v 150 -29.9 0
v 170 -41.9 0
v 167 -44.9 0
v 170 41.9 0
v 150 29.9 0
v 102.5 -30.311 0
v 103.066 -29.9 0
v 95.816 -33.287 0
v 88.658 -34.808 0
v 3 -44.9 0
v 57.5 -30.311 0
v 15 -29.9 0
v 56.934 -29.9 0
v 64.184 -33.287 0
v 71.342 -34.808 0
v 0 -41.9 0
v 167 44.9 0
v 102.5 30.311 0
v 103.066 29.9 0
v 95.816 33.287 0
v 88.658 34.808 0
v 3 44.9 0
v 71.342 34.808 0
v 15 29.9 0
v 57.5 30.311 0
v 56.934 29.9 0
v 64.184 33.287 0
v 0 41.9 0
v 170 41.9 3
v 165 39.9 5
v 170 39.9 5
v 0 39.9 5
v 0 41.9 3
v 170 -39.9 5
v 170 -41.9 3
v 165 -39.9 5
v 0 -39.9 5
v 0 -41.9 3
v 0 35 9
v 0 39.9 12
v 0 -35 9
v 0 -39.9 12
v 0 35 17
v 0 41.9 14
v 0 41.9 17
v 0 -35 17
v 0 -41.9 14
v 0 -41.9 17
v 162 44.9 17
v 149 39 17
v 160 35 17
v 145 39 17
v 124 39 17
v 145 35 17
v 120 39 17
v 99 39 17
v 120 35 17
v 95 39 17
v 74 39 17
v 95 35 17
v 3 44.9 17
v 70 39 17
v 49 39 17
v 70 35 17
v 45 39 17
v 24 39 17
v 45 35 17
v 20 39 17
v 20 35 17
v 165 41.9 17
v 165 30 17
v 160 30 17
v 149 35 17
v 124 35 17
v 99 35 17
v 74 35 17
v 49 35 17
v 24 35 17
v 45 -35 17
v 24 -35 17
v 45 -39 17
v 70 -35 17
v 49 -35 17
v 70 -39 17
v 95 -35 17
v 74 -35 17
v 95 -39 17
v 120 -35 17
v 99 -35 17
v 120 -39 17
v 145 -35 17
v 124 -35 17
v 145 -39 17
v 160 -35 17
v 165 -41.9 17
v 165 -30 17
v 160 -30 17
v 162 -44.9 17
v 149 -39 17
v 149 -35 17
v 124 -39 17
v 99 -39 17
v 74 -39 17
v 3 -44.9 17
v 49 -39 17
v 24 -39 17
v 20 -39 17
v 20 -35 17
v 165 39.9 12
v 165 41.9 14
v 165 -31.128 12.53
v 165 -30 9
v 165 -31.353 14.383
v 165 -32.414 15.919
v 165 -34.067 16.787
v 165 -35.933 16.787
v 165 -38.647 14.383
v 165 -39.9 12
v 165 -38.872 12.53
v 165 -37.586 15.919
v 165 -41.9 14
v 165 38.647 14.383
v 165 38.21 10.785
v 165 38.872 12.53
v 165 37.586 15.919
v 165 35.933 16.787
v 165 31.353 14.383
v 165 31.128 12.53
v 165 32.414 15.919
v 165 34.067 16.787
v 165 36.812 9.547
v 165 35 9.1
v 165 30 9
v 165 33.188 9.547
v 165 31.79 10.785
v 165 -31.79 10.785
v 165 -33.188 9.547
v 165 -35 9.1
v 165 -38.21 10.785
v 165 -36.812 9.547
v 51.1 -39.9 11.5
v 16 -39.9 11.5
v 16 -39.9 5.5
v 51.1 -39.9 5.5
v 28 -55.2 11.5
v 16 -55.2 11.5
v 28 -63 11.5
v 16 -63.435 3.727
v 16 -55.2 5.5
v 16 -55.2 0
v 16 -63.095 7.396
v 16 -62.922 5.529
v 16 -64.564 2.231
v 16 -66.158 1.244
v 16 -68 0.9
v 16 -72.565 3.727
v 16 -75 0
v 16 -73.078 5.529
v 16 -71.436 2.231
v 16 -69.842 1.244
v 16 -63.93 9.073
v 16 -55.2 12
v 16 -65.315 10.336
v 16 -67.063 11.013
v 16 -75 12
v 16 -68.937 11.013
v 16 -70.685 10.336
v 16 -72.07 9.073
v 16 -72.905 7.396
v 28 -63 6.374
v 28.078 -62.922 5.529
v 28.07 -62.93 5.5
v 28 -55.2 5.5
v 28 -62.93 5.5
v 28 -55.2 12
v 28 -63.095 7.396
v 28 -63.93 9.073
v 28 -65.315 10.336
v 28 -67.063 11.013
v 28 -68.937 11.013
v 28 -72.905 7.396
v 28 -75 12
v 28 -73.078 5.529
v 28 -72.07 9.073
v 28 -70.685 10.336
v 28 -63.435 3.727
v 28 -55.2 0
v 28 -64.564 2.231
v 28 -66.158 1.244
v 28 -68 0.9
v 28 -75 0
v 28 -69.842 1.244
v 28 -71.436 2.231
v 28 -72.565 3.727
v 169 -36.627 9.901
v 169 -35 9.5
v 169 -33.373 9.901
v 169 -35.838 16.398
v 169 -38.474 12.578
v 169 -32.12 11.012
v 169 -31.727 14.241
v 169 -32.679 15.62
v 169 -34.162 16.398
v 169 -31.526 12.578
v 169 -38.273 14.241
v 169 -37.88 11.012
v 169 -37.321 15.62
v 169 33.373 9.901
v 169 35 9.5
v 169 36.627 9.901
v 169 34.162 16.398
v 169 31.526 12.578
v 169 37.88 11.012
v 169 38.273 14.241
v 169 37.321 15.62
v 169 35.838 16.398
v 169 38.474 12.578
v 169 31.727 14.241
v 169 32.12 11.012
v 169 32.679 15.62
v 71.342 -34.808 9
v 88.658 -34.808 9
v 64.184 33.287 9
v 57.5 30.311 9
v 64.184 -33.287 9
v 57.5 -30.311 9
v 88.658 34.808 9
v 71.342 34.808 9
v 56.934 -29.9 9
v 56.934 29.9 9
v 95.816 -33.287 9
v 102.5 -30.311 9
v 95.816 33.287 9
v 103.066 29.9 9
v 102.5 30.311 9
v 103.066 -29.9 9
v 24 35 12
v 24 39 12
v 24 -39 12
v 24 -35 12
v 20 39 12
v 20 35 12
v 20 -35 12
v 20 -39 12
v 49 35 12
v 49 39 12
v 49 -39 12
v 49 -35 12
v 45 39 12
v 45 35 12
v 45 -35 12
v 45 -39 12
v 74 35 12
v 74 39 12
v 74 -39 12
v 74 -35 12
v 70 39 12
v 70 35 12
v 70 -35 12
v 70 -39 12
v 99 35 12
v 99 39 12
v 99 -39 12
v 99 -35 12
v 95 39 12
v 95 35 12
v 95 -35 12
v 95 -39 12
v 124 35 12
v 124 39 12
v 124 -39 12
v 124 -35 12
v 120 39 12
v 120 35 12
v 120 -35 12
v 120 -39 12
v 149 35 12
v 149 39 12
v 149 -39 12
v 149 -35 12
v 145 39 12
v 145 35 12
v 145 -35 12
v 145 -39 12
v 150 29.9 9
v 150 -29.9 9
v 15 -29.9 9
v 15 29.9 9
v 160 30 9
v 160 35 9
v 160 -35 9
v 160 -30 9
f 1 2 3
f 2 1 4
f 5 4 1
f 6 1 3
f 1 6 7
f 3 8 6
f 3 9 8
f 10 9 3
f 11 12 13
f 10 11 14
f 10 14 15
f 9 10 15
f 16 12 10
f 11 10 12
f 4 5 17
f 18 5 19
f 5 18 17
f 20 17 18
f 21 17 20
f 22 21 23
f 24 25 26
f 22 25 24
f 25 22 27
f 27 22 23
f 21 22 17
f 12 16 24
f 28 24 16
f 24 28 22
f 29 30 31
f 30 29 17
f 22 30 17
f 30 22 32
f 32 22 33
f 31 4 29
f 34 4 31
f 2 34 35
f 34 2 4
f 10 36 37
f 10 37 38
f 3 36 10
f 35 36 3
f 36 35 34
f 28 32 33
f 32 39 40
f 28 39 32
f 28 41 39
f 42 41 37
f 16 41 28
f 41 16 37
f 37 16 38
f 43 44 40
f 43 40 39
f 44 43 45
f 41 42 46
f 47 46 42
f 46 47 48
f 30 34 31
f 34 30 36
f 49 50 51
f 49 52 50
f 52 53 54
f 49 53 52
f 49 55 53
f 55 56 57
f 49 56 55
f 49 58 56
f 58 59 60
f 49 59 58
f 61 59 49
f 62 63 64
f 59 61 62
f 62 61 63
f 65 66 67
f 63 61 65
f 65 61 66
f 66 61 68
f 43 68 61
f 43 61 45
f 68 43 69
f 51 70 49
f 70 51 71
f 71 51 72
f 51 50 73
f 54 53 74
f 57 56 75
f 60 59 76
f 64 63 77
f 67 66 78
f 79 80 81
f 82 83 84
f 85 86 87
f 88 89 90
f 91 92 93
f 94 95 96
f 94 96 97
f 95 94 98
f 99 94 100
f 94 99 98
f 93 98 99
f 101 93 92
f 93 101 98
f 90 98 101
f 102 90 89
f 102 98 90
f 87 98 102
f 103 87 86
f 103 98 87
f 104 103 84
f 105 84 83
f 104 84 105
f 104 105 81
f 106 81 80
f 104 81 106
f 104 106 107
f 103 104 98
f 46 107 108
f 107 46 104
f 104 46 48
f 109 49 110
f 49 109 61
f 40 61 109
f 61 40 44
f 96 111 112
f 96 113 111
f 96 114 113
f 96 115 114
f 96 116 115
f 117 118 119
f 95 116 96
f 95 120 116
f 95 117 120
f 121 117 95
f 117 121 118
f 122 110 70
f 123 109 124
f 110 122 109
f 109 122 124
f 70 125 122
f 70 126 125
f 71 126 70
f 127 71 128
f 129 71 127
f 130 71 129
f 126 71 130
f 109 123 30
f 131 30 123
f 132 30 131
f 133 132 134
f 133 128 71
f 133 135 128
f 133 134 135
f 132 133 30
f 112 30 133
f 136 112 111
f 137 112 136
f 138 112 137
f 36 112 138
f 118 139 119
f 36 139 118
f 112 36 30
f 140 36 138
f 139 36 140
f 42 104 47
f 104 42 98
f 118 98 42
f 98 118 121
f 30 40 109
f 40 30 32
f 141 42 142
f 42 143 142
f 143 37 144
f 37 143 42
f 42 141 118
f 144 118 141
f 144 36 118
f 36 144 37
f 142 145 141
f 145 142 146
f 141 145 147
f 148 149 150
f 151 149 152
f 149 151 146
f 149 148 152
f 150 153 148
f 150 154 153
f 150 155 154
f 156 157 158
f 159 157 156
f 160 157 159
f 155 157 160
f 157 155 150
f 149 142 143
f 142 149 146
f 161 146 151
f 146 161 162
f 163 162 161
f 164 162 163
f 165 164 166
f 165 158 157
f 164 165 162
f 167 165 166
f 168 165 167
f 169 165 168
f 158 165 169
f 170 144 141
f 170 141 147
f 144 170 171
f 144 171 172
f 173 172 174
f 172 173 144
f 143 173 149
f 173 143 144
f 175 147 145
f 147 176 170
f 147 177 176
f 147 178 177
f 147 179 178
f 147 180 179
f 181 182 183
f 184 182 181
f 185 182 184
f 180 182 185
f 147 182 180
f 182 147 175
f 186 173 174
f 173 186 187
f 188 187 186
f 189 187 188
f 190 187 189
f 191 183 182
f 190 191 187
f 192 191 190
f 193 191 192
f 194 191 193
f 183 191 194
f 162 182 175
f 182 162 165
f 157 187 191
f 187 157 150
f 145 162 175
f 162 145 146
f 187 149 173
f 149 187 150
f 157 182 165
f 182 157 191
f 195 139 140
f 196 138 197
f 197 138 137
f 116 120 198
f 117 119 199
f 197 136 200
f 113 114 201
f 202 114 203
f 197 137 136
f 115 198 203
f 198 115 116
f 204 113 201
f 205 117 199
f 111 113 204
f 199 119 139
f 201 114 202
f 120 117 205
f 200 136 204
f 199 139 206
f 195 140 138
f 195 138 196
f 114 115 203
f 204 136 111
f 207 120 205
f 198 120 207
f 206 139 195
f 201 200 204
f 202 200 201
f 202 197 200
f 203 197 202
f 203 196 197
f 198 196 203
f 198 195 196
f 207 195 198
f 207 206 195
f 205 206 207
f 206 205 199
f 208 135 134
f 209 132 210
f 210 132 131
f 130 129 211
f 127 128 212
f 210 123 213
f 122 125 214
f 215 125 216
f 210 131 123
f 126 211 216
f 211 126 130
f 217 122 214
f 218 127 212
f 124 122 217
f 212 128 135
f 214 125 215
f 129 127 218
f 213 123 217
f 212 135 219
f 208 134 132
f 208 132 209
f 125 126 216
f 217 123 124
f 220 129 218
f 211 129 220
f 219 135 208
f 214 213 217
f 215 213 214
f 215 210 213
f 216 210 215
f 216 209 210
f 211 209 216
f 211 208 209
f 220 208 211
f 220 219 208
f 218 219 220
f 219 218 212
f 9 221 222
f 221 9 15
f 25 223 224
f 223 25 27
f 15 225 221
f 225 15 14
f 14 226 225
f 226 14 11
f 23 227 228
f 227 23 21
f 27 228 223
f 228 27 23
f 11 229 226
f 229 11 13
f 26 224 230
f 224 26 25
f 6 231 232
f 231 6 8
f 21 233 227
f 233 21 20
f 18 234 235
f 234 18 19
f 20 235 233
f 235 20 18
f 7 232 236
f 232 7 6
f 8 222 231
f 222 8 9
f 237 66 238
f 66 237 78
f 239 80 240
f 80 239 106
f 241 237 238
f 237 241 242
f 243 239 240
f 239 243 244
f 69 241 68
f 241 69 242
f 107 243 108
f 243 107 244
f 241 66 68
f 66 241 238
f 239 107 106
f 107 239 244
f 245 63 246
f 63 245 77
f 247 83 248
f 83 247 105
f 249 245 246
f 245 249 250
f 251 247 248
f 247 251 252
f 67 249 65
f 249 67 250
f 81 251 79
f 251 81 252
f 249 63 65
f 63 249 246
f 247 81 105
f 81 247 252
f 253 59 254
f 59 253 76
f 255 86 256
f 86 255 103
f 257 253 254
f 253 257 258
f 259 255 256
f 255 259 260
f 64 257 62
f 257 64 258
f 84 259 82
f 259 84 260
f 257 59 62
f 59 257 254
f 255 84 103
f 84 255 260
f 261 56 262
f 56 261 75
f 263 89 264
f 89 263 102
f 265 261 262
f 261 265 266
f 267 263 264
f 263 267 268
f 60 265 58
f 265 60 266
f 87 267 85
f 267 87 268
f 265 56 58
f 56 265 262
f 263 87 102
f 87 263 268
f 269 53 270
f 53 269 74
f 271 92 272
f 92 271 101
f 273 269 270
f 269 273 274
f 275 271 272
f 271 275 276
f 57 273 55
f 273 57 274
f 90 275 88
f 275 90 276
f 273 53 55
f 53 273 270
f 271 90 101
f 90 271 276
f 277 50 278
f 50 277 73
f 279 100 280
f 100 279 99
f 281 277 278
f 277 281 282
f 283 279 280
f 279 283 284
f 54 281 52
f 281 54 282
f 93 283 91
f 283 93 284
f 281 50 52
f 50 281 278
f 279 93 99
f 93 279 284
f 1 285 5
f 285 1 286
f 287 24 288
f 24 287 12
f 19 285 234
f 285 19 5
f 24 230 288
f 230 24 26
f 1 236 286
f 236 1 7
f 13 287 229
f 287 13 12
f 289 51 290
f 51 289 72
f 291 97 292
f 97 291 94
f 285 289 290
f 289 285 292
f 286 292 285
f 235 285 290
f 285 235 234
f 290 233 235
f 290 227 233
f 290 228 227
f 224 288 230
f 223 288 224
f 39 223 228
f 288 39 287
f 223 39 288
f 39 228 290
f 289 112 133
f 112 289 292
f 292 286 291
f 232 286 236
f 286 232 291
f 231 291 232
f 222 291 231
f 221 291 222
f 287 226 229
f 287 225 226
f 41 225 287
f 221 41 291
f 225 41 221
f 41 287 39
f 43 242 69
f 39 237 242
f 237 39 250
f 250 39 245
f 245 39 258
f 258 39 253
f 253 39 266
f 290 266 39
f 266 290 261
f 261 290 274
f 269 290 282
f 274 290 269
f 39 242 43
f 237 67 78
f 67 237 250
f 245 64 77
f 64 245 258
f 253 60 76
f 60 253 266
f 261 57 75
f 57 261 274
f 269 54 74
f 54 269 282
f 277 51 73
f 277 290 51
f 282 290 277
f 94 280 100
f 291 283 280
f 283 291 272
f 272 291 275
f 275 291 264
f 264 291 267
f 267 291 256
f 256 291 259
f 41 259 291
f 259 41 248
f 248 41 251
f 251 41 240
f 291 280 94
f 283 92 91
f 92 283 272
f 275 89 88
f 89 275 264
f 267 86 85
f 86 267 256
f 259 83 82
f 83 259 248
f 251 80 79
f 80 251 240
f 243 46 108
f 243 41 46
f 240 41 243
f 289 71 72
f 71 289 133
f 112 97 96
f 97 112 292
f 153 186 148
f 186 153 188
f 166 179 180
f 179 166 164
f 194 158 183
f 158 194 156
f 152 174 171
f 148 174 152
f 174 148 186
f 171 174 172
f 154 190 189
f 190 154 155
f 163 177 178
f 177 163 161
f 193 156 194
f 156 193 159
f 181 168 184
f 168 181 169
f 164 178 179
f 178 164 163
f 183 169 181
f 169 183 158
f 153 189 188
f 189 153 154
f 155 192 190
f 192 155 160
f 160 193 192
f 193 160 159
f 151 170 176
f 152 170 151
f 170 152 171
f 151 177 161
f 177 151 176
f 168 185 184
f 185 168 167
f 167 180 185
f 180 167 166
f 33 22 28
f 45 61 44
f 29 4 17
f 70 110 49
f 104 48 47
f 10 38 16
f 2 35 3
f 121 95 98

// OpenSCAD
// file: config_4x5.scad
/*
This is the base configuration file for the 4x5" format
# we are not using the exact ANSI measures, but slightly rounded measures for slight simplification
*/
vStabilizerTotal_h = 7;

// general tolerance
vTolerance = 0.2;

// sheet film and cassette measurements (roughly based on the ANSI measurements)
vFilmSheet_l = 127;
vFilmSheet_w = 102;
vCassette_l = 160; // A min
vCassette_w = 121; // B max
vCassette_h = 13.2; // C max
vLightTrap_l = 2; // M2
vLightTrap_w = vCassette_w;
vLightTrap_h = 1.5; // M1
vLightTrap_offsetX = 141; // G max
vFilmWindow_l = 121;
vFilmWindow_w = 101;
vFilmWindow_offsetX = 16;
vGroundGlass_offsetZ = 5;

// Graflok
vGraflok_h = 6; // this is not the official measurement, just measured from a camera 

// lens board measures (we are using Wista/Technika-style lensboards)
vLensboard_l = 100;
vLensboard_w = 97;
vLensboard_h = 2;
vLensboard_offsetX = -(vLensboard_l+3)/2; // caution: we have an asymetric offset!
vLensboard_offsetY = -vLensboard_w/2;
vLensboardHole_d = 85;
vLensboardLighttrap_d = 89;
vLensboardLighttrap_h = 1+vTolerance;

// bellows frame measures - the bellows frame design is derived from standardcameras.com
// back frame
vBellowsBackInner_l = 144; //???? check and replace with the measurement from your bellows!
vBellowsBackInner_w = vBellowsBackInner_l;
vBellowsBackOuter_l = vBellowsBackInner_l+1;
vBellowsBackOuter_w = vBellowsBackOuter_l;

vBellowsBackFrameOuter_l = 159;
vBellowsBackFrameOuter_w = vBellowsBackFrameOuter_l;
vBellowsBackFrameOuter_h = 7;
vBellowsBackFrameInner_l = 135;
vBellowsBackFrameInner_w = vBellowsBackFrameInner_l;
vBellowsBackFrameInner_h = 5;

vBellowsBackLightTrapOuter_l = vBellowsBackFrameInner_l+2*2;
vBellowsBackLightTrapOuter_w = vBellowsBackLightTrapOuter_l;
vBellowsBackLightTrap_h = 3;

vBellowsBackFrameScrewHole_d = 2;
vBellowsBackFrameScrewHole_h = 10;
vBellowsBackFrameScrewHole_offsetXY = 70;
vBellowsBackFrameScrewHole_offsetZ = vBellowsBackFrameOuter_h/2;

// front frame
vBellowsFrontInner_l = 94; //???? check and replace with the measurement from your bellows!
vBellowsFrontInner_w = vBellowsFrontInner_l;
vBellowsFrontOuter_l = vBellowsFrontInner_l+1;
vBellowsFrontOuter_w = vBellowsFrontOuter_l;

vBellowsFrontFrameOuter_l = 104;
vBellowsFrontFrameOuter_w = vBellowsFrontFrameOuter_l;
vBellowsFrontFrameOuter_h = 7;
vBellowsFrontFrameInner_l = 82;
vBellowsFrontFrameInner_w = vBellowsFrontFrameInner_l;
vBellowsFrontFrameInner_h = 5;

vBellowsFrontLightTrapOuter_l = vBellowsFrontFrameInner_l+2*2;
vBellowsFrontLightTrapOuter_w = vBellowsFrontLightTrapOuter_l;
vBellowsFrontLightTrap_h = 0;

vBellowsFrontFrameScrewHole_d = 2;
vBellowsFrontFrameScrewHole_h = 10;
vBellowsFrontFrameScrewHole_offsetXY = 40;
vBellowsFrontFrameScrewHole_offsetZ = vBellowsFrontFrameOuter_h/2;

// body dimensions
vWall_strength = 5;
vBodyOuter_l = 185; // make sure this is at least 4*vWall_strength larger than vBellowsBackFrameOuter_l!
vBodyOuter_w = 170; // make sure this is at least 2*vWall_strength larger than vBellowsBackFrameOuter_l!
vBodyOuter_h = 65;
vBodyEdge_r = vWall_strength;

// we will center our model on the Y axis and on the center of the bellows frame
// at least for the 4x5 version, we have to do an asymetric offset of 2.5mm on the X-axis 
vAsymOffsetX = -2.5;  

// back plate
vBackPlateLength = 160; // we will probably use about the same size as the bellows back frame
vBackPlateStrength = vWall_strength;

// hinges for front lid
vHingeInnerDistance = 100;
vHingeBaseWidth = 20;
vHingeHole = 5;

// lid lock measures
vLidLockBase_d = 8;
vLidLockHole_distance = 70;

// rail dimensions
vLowerRail_w = 90;
vUpperRail_w = vLowerRail_w;

// cutout for stop indents
vStopIndent_l = 4;
vStopIndent_h = 5;
vStopIndentDistance = 25; // shorter than 25 is not necessary
vStopIndent_offsetX = 20; // don't go shorter than 20 if you intend to use a 90mm lens!

// for all dovetails we use a base width of 5mm and a base height of 5mm
// we are applying tolerances to the inner AND outer part of a dovetail, in width and height
vDoveTail_w = 5;
vDoveTail_h = 5;
vDoveTail_tolerance = 0.2;

// front standard carrier / slider
// width is depending on vUpperRail_w
vSliderBase_w = vUpperRail_w + (4*vDoveTail_w);
vSliderBase_l = 40; // make sure to have enough space in the body.


// lever plate 
vLeverPlateBase_w = vUpperRail_w - (8*vDoveTail_w);
vLeverPlateBlock_w = 25;
vLeverPlateBlock_l = vSliderBase_l-(2*vDoveTail_w);

vFrontStandard_h = 130;
vFrontStandardSlot_h = vFrontStandard_h - 30;

// lensboard carrier
vFrontPlate_length = vSliderBase_w+6; // vSliderBase_w is a bit too tight for 4x5", so there we will add 5mm, for 5x7 vSliderBase_w is OK to get a squared lensboard carrier
vFrontPlate_width = vSliderBase_w; //vFrontPlate_length;
vFrontPlate_height = 16;
vEdgeCutCylinder = floor(sqrt(2*pow(vFrontPlate_width,2)))-5;

vTiltDovetailBase_d1 = 30;
vTiltDovetailBase_d2 = vTiltDovetailBase_d1+(2*vDoveTail_w);
vTiltDovetailBaseBlock_d = vTiltDovetailBase_d1+(4*vDoveTail_w);

vTiltDovetail_d1 = vTiltDovetailBase_d1-vTolerance;
vTiltDovetail_d2 = vTiltDovetailBase_d2-vTolerance;
vTiltDovetail_h = vDoveTail_w-vTolerance;

vTiltDovetailCutout_d1 = vTiltDovetailBase_d2+vTolerance;
vTiltDovetailCutout_d2 = vTiltDovetailBase_d1+vTolerance;

vAxisHole_d = 10+vTolerance;
vAxisHole_h = vDoveTail_w+vTolerance;

vTiltLockBolt_d = 12;
vTiltLockBolt_h = 14;
vTiltLockBoltHole_d = 8;
vTiltLockBoltHole_h = vTiltLockBolt_h;

vTiltHeight = 50;
vTiltRadius = vFrontPlate_length/2;
vTiltAngleMinus = -7;
vTiltAnglePlus = 7;
vTiltAxis_d = 10-vTolerance;

// focusing rod
vFocusingRod_d = 6;
vFocusingKnob_d = 25;
vFocusingKnob_h = 20;

// stabilizer measures (just the outer measures of our stabilizer block, not the tripod slider)
vStabilizerBase_l = 135;
vStabilizerBase_w = 90;  
vStabilizerBase_h = 7;
vStabilizerDovetailBase_w = 50;
// screw holes for the stabilizer
vLidHoleCount_x = 4;
vLidHoleDist_x = 35;
vLidHoleCount_y = 2;
vLidHoleDist_y = 60;


// screw diameters, length is individually set
vScrew1Hole_d = 3;
vScrew1ThreadHole_d = 2.2;
vScrew2Hole_d = 2;
vScrew2ThreadHole_d = 1.4;


 
// file: modules.scad
/*
This is a collection of the modules which are used heavily within the whole project.
Almost all parts rely on the modules to remain "as is", especially regarding their current orientation.
So please act very carefully here, otherwise you may screw up the complete design!

*/
include <baseconfig.scad>;


// roof module - this is heavily used for dovetail cutouts
// please keep as is
module roof(l, w, h){
    polyhedron(
        points=[
            [0,0,0],
            [l,0,0],
            [l,w,0],
            [0,w,0],
            [0,w/2,h],
            [l,w/2,h]
            ],
        faces=[
            [0,1,2,3],
            [0,4,1],
            [1,4,5,2],
            [2,5,3],
            [3,5,4,0]
            ]
            );
    };

// a wedge module - this is heavily used for cutting edges
// please keep as is    
module wedge(l, w, h) {
    polyhedron(
            points=[
                [0,0,0],
                [l,0,0],
                [l,w,0],
                [0,w,0],
                [0,0,h],
                [l,0,h]
            ],
            faces=[
                [0,3,2,1],
                [0,1,5,4],
                [1,2,5],
                [2,3,4,5],
                [3,0,4]
            ]
    );
   };

// simple tube module.   
module tube(d1, d2, h) {
    difference() {
        cylinder(d=d1, h=h);
        cylinder(d=d2, h=h);
        };
    };

// mainly used for making holes for countersunk screws
// please keep as is    
module countersunk_screw(vScrew_d, vScrew_l){
    union(){
    cylinder(d=vScrew_d, h=vScrew_l);
    cylinder(d1=vScrew_d*2, d2=0, h=vScrew_d);
    };
};

// module for making hexagons, e.g. hex nuts. kw is the key width
// please keep as is
module hex(kw, h) {
	render()
        translate([0, 0, h/2])
            intersection_for(a = [0, 120, 240]) {
                rotate([0, 0, a])
                    cube([kw, 3 * kw, h], true);
                }
}


// Heatset insert
// d: Thread diameter
// od: Outer diameter
// l: Total length
module insert(d, od, l)
{
    echo(Insert = d, od, l);
    difference() {
        cylinder(l, d=od, $fn=15);
        translate([0, 0, -0.5]) cylinder(l+1, d=d, $fn=15);
        };
}

module insert_m2()
{
    color("gold") insert(2, vInsertM2Size_d, vInsertM2Depth_h);
}

module insert_m3()
{
    color("gold") insert(3, vInsertM3Size_d, vInsertM3Depth_h);
}

module insert_m5()
{
    color("gold") insert(5, vInsertM5Size_d, vInsertM5Depth_h);
}

// Countersunk screw, metric, for display
// Example: https://www.aliexpress.com/item/1005007838338973.html
module screw_cs(l, d=3, dk=6, s=2, t=1) {
    // l: total length (including head) in mm
    // d: thread diameter (eg 3 for M3)
    // dk: max head diameter
    // s: hex socket flat-to-flat size
    // t: hex socket depth
    echo(CountersunkScrew = d, l);
    difference() {
        union() {
            cylinder(h=l, r=d/2, $fn=15);
            cylinder(h=(dk-d)/2, r1=dk/2, r2=d/2, $fn=15);
            }
        cylinder(h=t, r=s/2*2/sqrt(3), $fn=6);
    }
}

module screw_m3_cs(l) {
    color("silver") screw_cs(l, d=3, dk=6, s=2, t=1);
}

module screw_m2_cs(l) {
    color("silver") screw_cs(l, d=2, dk=3.8, s=1.5, t=0.75);
}
module screw_m5_cs(l) {
    color("silver") screw_cs(l, d=5, dk=9.5, s=3, t=1.6);
}

// Button head screw, metric, for display
// Example: https://www.aliexpress.com/item/32967225441.html
module screw_bh(l, d=3, k=1.5, dk=5.5, s=2, t=1) {
    // l: shaft length (NOT including head) in mm
    // d: thread diameter (eg 3 for M3)
    // k: head depth
    // dk: head max diameter
    // s: hex socket flat-to-flat size
    // t: hex socket depth
    echo(BallheadScrew = d, l);
    difference() {
        union() {
            translate([0, 0, k]) cylinder(h=l, r=d/2, $fn=15);
            difference() {
                translate([0, 0, k]) intersection() {
                    sphere(d=dk, $fn=15);
                    translate([-dk/2, -dk/2, -dk]) cube(dk);
                }
                translate([-dk/2, -dk/2, -dk]) cube(dk);
            }
        }
        cylinder(h=t, r=s/2*2/sqrt(3), $fn=6);
    }
}

module screw_m2_bh(l) {
    color("silver") screw_bh(l, d=2, dk=3.4, s=1.175, t=0.6);
}

module screw_m3_bh(l) {
    color("silver") screw_bh(l, d=3, dk=5.7, s=2, t=1);
}


module nut_m5() {
    echo(Nut = 5);
    difference() {
        rotate([0, 0, 30]) cylinder(h=3.9, d=8*2/sqrt(3), $fn=6);
        cylinder(h=5, d=5, $fn=15);
        }
    }
    
    
module thumbscrew(bolt_d, bolt_dk, screw_d, screw_h, n_knurls, knurl_d, knurl_f) {
    // bolt_d:  central bolt diameter
    // bolt_dk: bolt head max diameter
    // screw_d: thumbscrew outer diameter
    // screw_h: thumbscrew height
    // n_knurls: number of knurls
    
    min_knurl_offset = screw_d/2 - knurl_d;
    max_knurl_offset = screw_d/2 + knurl_d;
    knurl_offset = min_knurl_offset + knurl_f*(max_knurl_offset - min_knurl_offset);
    
    difference()
    {
        union()
        {
            translate([0, 0, 1]) cylinder(screw_h-2, d=screw_d);
            cylinder(1, d1=screw_d-1, d2=screw_d);
            translate([0, 0, screw_h-1]) cylinder(1, d1=screw_d, d2=screw_d-1);
        }
        cylinder(screw_h, d=bolt_d);
        cylinder(bolt_dk/2, d1=bolt_dk, d2=0);
        for (i = [1:n_knurls])
        {
            rotate([0, 0, i*360/(n_knurls)]) translate([knurl_offset, 0, 0]) cylinder(screw_h, d=knurl_d);
        }
    }
}

module thumbscrew_m5(screw_d, screw_h, n_knurls, knurl_d, knurl_f) {
    thumbscrew(5, 9.5, screw_d, screw_h, n_knurls, knurl_d, knurl_f);
}


module t6_flange_coupler() {
    // T6 flange coupler
    // Example: https://www.aliexpress.com/item/1005008049363389.html
    echo(FlangeCoupler = 6);
    difference() {
        union() {
            translate([0, 0, 2]) cylinder(h=10, d=10);
            cylinder(h=2, d=22);
        }
        cylinder(h=12, d=6);
        translate([0, 15, 7]) rotate([90, 0, 0]) cylinder(h=30, d=3);
        for (i = [0:3]) {
            rotate([0, 0, 45+90*i]) translate([-8, 0, 0]) cylinder(h=2, d=3);
        }
    }
}


module AXK0619_thrust_bearing() {
    echo(ThrustBearing = "AXK0619");
    difference() {
        cylinder(h=4, d=19);
        cylinder(h=4, d=6);
    }
}


module t6_lead_screw(l) {
    echo(LeadScrewT6 = l);
    color("silver") cylinder(h=l, d=6);
}

module t6_lead_screw_nut() {
    echo("LeadScrewT6Nut");
    intersection()
    {
        difference() {
            union() {
                cylinder(h=15, d=12);
                translate([0, 0, 1.5]) cylinder(h=3.5, d=24);
            }
            cylinder(h=15, d=6);
        }  
        translate([-50, -12.5/2, -50]) cube([100, 12.5, 100]);
    }
}

module m5_rod(l) {
    echo(ThreadedRodM5 = l);
    color("silver") cylinder(h=l, d=5);
}


module screw_m3_grub(l) {
    echo(GrubScrew = 3, l);
    cylinder(h=l, d=3, $fn=15);
}
// file: baseconfig.scad
/*
Here we define some variables which are independent from the camera format
*/


// some generic variables

// we are including a format specific configuration sheet - but make sure to include only one!

include <config_4x5.scad>;
// include <config_5x7.scad>;
// include <config_8x10.scad>;

// Arca Swiss tripod plate
// caution: some Arca Swiss compatible tripod heads may have slight variations
// vArca_length = xx; // the length is irrelevant here
vArca_width = 38;
vArca_height = 7;
vArcaBase_cutout = 4;
vArcaBase_height = 1.5;
// main file
// loading the base configuration
include <baseconfig.scad>;

// some modules such as hex, countersunk screws, roof, wedge are available in a module file
use <modules.scad>;
    
// some measures in here are hard wired based on the experience with the first prototype. Normally there is no need to change them (except a measure is hinted with "adapt")

module rails() {

vRailTolerance = vTolerance;
    
vLowerRail_l = vBodyOuter_l-15; // we need 5mm space to move backwards for the lid lock
vLowerRailOuter_w = vLowerRail_w-vRailTolerance;
vLowerRailInner_w = vLowerRail_w-(2*vDoveTail_w)-vRailTolerance;
vLowerRail_h = vDoveTail_h;
vLowerRail_offsetX = 0;
vLowerRail_offsetY = -vLowerRailOuter_w/2;
vLowerRail_offsetZ = 0;

vUpperRail_l = vLowerRail_l-5;
vUpperRailOuter_w = vLowerRailOuter_w;
vUpperRail_h = vLowerRail_h;
vUpperRail_offsetX = 0;
vUpperRail_offsetY = -(vUpperRailOuter_w/2);
vUpperRail_offsetZ = 0;

vMidSection_h = 7; // 7 should fit for 4x5 and 5x7

vUpperBlock_l = vUpperRail_l;
vUpperBlock_w = vLowerRailInner_w;
vUpperBlock_h = vUpperRail_h + vMidSection_h;
vUpperBlock_offsetX = 0;
vUpperBlock_offsetY = -vUpperBlock_w/2;
vUpperBlock_offsetZ = vLowerRail_h;

vMidCutout_l = vUpperRail_l-30;
vMidCutout_w = vLowerRailOuter_w-30;
vMidCutout_h = vLowerRail_h+vUpperBlock_h;
vMidCutout_offsetX = 15;
vMidCutout_offsetY = -vMidCutout_w/2;
vMidCutout_offsetZ = 0;

vUpperCutout_l = vUpperRail_l-5;
vUpperCutout_w = vUpperRailOuter_w-(4*vDoveTail_w)+vRailTolerance;
vUpperCutout_h = vMidSection_h+1;
vUpperCutout_offsetX = 0;
vUpperCutout_offsetY = -vUpperCutout_w/2;
vUpperCutout_offsetZ = vMidCutout_h-vUpperCutout_h;

vFrontCutout_l = vUpperRail_l;
vFrontCutout_w = vUpperCutout_w-10;
vFrontCutout_h = vUpperCutout_h;
vFrontCutout_offsetX = 0;
vFrontCutout_offsetY = -vFrontCutout_w/2;
vFrontCutout_offsetZ = vUpperCutout_offsetZ;

vLensCutout_d = vUpperCutout_w; 
vLensCutout_h = vLowerRail_h+vUpperBlock_h;
vLensCutout_offsetX = (vLowerRail_l/2)-10; 
vLensCutout_offsetY = 0;
vLensCutout_offsetZ = 0;

// cutout for stop indents
vStopIndent_w = vUpperCutout_w + (2*vStopIndent_l);
vStopIndentCount = floor(vUpperRail_l/vStopIndentDistance);
vStopIndent_offsetY = -vStopIndent_w/2;
vStopIndent_offsetZ = vLowerRail_h+vMidSection_h+vUpperRail_h-vStopIndent_h;

vFocusingLever_w = (vBodyOuter_w/2)-10;
vFocusingLever_l = vFocusingLever_w;
vFocusingLever_h = vMidSection_h-1;
vFocusingLever_offsetX = 16; // manually set, probably no need to change things here
vFocusingLever_offsetY = 0;
vFocusingLever_offsetZ = vLowerRail_h + vFocusingLever_h + 0.5;

vFocusingThreadBlock_l = 12; // as long as we keep T5 or T6 rods, there's no need to change things here
vFocusingThreadBlock_w = 20-vTolerance;
vFocusingThreadBlock_h = 12;
vFocusingThreadBlock_offsetX = vFocusingLever_offsetX;
vFocusingThreadBlock_offsetY = -vFocusingLever_w;
vFocusingThreadBlock_offsetZ = 0;

vFocusingThreadHole_d = 10+vTolerance; // T6 = 10, T5 = 8
vFocusingThreadHole_h = vFocusingLever_l;
vFocusingThreadHole_offsetX = vFocusingLever_offsetX;
vFocusingThreadHole_offsetY = -vFocusingLever_w+7; // don't change this, unless you also check the corresponding value for front lid and focusing block
vFocusingThreadHole_offsetZ = 6;


vLidLock_d1 = vLidLockBase_d-vTolerance;
vLidLock_d2 = vLidLockBase_d-1; // we make cones, so it is easier to lock
vLidLock_h = 4;
vLidLock_offsetX = vUpperRail_l; // we need a locking lenght of about 4mm
vLidLock_offsetY = -vLidLockHole_distance/2; // double check if this fits to the upper rail width!
vLidLock_offsetZ = 5+vLidLockBase_d;

vEdgeCutoff = 3;
vEdgeCutoff_h = vLowerRail_h+vMidSection_h+vUpperRail_h;

difference(){
union(){
    // lower rail
    difference(){
        translate([vLowerRail_offsetX, vLowerRail_offsetY, vLowerRail_offsetZ])
            roof(vLowerRail_l, vLowerRailOuter_w, vLowerRailOuter_w/2);
        translate([vLowerRail_offsetX, vLowerRail_offsetY, vLowerRail_h])
            cube([vLowerRail_l, vLowerRailOuter_w, vLowerRailOuter_w/2]);    
    };

    // upper block
    translate([vUpperBlock_offsetX, vUpperBlock_offsetY, vUpperBlock_offsetZ])
            cube([vUpperBlock_l, vUpperBlock_w, vUpperBlock_h]);    
    
    // focusing lever
    translate([vFocusingLever_offsetX, vFocusingLever_offsetY, vFocusingLever_offsetZ])
        rotate([0, 90, 0])
            wedge(vFocusingLever_h, -vFocusingLever_w, vFocusingLever_l);
    
    
    // focusing lever thread block
    translate([vFocusingThreadBlock_offsetX, vFocusingThreadBlock_offsetY, vFocusingThreadBlock_offsetZ])
                cube([vFocusingThreadBlock_l, vFocusingThreadBlock_w, vFocusingThreadBlock_h]);
        
    // lid lock bolts
    translate([vLidLock_offsetX, vLidLock_offsetY, vLidLock_offsetZ])
        rotate([0, 90, 0])
            cylinder(d1=vLidLock_d1, d2=vLidLock_d2, h=vLidLock_h);
    translate([vLidLock_offsetX, -vLidLock_offsetY, vLidLock_offsetZ])
        rotate([0, 90, 0])
            cylinder(d1=vLidLock_d1, d2=vLidLock_d2, h=vLidLock_h);
    
    // lower rail
    translate([0,0,vLowerRail_h+vUpperBlock_h])
        mirror([0,0,1]){
            difference(){
                translate([vUpperRail_offsetX, vUpperRail_offsetY, vUpperRail_offsetZ])
                    roof(vUpperRail_l, vUpperRailOuter_w, vUpperRailOuter_w/2);
                translate([vUpperRail_offsetX, vUpperRail_offsetY, vUpperRail_h])
                    cube([vUpperRail_l, vUpperRailOuter_w, vUpperRailOuter_w/2]);    
            };
        };

    };
    
    // mid cutout
    translate([vMidCutout_offsetX, vMidCutout_offsetY, vMidCutout_offsetZ])
        cube([vMidCutout_l, vMidCutout_w, vMidCutout_h]); 
 
    // upper cutout
    translate([vUpperCutout_offsetX, vUpperCutout_offsetY, vUpperCutout_offsetZ])
        cube([vUpperCutout_l, vUpperCutout_w, vUpperCutout_h]);
   
    // front cutout
    translate([vFrontCutout_offsetX, vFrontCutout_offsetY, vFrontCutout_offsetZ])
        cube([vFrontCutout_l, vFrontCutout_w, vFrontCutout_h]);
    
    for (i = [0:5]){ 
    // lens cutout
    translate([vLensCutout_offsetX+(i*2), vLensCutout_offsetY, vLensCutout_offsetZ])
        cylinder(d=vLensCutout_d, h=vLensCutout_h);
    };
    
    // stop indents
    for (i=[0:vStopIndentCount]){
    translate([i*vStopIndentDistance+vStopIndent_offsetX, vStopIndent_offsetY, vStopIndent_offsetZ])
        cube([vStopIndent_l, vStopIndent_w, vStopIndent_h]);        
    };

    // focusing thread hole
    translate([vFocusingThreadHole_offsetX, vFocusingThreadHole_offsetY, vFocusingThreadHole_offsetZ])
        rotate([0, 90, 0])
            cylinder(d=vFocusingThreadHole_d, h=vFocusingThreadHole_h);
    
    // edge cutoff
    // back left
    translate([0, -vLowerRail_offsetY, 0])
        rotate([0, -90, 0])
            wedge(vEdgeCutoff_h, -vEdgeCutoff, -vEdgeCutoff);
    // lower front left
    translate([vLowerRail_l, -vLowerRail_offsetY, 0])
        rotate([0, -90, 0])
            wedge(vEdgeCutoff_h, -vEdgeCutoff, vEdgeCutoff);
    // upper front left
    translate([vUpperRail_l, -vLowerRail_offsetY, vLowerRail_h])
        rotate([0, -90, 0])
            wedge(vEdgeCutoff_h, -vEdgeCutoff, vEdgeCutoff);
    // back right
    translate([0, vLowerRail_offsetY, 0])
        rotate([0, -90, 0])
            wedge(vEdgeCutoff_h, vEdgeCutoff, -vEdgeCutoff);
    // lower front right
    translate([vLowerRail_l, vLowerRail_offsetY, 0])
        rotate([0, -90, 0])
            wedge(vEdgeCutoff_h, vEdgeCutoff, vEdgeCutoff);
    // upper front right
    translate([vUpperRail_l, vLowerRail_offsetY, vLowerRail_h])
        rotate([0, -90, 0])
            wedge(vEdgeCutoff_h, vEdgeCutoff, vEdgeCutoff);
    
};

};

rails();
